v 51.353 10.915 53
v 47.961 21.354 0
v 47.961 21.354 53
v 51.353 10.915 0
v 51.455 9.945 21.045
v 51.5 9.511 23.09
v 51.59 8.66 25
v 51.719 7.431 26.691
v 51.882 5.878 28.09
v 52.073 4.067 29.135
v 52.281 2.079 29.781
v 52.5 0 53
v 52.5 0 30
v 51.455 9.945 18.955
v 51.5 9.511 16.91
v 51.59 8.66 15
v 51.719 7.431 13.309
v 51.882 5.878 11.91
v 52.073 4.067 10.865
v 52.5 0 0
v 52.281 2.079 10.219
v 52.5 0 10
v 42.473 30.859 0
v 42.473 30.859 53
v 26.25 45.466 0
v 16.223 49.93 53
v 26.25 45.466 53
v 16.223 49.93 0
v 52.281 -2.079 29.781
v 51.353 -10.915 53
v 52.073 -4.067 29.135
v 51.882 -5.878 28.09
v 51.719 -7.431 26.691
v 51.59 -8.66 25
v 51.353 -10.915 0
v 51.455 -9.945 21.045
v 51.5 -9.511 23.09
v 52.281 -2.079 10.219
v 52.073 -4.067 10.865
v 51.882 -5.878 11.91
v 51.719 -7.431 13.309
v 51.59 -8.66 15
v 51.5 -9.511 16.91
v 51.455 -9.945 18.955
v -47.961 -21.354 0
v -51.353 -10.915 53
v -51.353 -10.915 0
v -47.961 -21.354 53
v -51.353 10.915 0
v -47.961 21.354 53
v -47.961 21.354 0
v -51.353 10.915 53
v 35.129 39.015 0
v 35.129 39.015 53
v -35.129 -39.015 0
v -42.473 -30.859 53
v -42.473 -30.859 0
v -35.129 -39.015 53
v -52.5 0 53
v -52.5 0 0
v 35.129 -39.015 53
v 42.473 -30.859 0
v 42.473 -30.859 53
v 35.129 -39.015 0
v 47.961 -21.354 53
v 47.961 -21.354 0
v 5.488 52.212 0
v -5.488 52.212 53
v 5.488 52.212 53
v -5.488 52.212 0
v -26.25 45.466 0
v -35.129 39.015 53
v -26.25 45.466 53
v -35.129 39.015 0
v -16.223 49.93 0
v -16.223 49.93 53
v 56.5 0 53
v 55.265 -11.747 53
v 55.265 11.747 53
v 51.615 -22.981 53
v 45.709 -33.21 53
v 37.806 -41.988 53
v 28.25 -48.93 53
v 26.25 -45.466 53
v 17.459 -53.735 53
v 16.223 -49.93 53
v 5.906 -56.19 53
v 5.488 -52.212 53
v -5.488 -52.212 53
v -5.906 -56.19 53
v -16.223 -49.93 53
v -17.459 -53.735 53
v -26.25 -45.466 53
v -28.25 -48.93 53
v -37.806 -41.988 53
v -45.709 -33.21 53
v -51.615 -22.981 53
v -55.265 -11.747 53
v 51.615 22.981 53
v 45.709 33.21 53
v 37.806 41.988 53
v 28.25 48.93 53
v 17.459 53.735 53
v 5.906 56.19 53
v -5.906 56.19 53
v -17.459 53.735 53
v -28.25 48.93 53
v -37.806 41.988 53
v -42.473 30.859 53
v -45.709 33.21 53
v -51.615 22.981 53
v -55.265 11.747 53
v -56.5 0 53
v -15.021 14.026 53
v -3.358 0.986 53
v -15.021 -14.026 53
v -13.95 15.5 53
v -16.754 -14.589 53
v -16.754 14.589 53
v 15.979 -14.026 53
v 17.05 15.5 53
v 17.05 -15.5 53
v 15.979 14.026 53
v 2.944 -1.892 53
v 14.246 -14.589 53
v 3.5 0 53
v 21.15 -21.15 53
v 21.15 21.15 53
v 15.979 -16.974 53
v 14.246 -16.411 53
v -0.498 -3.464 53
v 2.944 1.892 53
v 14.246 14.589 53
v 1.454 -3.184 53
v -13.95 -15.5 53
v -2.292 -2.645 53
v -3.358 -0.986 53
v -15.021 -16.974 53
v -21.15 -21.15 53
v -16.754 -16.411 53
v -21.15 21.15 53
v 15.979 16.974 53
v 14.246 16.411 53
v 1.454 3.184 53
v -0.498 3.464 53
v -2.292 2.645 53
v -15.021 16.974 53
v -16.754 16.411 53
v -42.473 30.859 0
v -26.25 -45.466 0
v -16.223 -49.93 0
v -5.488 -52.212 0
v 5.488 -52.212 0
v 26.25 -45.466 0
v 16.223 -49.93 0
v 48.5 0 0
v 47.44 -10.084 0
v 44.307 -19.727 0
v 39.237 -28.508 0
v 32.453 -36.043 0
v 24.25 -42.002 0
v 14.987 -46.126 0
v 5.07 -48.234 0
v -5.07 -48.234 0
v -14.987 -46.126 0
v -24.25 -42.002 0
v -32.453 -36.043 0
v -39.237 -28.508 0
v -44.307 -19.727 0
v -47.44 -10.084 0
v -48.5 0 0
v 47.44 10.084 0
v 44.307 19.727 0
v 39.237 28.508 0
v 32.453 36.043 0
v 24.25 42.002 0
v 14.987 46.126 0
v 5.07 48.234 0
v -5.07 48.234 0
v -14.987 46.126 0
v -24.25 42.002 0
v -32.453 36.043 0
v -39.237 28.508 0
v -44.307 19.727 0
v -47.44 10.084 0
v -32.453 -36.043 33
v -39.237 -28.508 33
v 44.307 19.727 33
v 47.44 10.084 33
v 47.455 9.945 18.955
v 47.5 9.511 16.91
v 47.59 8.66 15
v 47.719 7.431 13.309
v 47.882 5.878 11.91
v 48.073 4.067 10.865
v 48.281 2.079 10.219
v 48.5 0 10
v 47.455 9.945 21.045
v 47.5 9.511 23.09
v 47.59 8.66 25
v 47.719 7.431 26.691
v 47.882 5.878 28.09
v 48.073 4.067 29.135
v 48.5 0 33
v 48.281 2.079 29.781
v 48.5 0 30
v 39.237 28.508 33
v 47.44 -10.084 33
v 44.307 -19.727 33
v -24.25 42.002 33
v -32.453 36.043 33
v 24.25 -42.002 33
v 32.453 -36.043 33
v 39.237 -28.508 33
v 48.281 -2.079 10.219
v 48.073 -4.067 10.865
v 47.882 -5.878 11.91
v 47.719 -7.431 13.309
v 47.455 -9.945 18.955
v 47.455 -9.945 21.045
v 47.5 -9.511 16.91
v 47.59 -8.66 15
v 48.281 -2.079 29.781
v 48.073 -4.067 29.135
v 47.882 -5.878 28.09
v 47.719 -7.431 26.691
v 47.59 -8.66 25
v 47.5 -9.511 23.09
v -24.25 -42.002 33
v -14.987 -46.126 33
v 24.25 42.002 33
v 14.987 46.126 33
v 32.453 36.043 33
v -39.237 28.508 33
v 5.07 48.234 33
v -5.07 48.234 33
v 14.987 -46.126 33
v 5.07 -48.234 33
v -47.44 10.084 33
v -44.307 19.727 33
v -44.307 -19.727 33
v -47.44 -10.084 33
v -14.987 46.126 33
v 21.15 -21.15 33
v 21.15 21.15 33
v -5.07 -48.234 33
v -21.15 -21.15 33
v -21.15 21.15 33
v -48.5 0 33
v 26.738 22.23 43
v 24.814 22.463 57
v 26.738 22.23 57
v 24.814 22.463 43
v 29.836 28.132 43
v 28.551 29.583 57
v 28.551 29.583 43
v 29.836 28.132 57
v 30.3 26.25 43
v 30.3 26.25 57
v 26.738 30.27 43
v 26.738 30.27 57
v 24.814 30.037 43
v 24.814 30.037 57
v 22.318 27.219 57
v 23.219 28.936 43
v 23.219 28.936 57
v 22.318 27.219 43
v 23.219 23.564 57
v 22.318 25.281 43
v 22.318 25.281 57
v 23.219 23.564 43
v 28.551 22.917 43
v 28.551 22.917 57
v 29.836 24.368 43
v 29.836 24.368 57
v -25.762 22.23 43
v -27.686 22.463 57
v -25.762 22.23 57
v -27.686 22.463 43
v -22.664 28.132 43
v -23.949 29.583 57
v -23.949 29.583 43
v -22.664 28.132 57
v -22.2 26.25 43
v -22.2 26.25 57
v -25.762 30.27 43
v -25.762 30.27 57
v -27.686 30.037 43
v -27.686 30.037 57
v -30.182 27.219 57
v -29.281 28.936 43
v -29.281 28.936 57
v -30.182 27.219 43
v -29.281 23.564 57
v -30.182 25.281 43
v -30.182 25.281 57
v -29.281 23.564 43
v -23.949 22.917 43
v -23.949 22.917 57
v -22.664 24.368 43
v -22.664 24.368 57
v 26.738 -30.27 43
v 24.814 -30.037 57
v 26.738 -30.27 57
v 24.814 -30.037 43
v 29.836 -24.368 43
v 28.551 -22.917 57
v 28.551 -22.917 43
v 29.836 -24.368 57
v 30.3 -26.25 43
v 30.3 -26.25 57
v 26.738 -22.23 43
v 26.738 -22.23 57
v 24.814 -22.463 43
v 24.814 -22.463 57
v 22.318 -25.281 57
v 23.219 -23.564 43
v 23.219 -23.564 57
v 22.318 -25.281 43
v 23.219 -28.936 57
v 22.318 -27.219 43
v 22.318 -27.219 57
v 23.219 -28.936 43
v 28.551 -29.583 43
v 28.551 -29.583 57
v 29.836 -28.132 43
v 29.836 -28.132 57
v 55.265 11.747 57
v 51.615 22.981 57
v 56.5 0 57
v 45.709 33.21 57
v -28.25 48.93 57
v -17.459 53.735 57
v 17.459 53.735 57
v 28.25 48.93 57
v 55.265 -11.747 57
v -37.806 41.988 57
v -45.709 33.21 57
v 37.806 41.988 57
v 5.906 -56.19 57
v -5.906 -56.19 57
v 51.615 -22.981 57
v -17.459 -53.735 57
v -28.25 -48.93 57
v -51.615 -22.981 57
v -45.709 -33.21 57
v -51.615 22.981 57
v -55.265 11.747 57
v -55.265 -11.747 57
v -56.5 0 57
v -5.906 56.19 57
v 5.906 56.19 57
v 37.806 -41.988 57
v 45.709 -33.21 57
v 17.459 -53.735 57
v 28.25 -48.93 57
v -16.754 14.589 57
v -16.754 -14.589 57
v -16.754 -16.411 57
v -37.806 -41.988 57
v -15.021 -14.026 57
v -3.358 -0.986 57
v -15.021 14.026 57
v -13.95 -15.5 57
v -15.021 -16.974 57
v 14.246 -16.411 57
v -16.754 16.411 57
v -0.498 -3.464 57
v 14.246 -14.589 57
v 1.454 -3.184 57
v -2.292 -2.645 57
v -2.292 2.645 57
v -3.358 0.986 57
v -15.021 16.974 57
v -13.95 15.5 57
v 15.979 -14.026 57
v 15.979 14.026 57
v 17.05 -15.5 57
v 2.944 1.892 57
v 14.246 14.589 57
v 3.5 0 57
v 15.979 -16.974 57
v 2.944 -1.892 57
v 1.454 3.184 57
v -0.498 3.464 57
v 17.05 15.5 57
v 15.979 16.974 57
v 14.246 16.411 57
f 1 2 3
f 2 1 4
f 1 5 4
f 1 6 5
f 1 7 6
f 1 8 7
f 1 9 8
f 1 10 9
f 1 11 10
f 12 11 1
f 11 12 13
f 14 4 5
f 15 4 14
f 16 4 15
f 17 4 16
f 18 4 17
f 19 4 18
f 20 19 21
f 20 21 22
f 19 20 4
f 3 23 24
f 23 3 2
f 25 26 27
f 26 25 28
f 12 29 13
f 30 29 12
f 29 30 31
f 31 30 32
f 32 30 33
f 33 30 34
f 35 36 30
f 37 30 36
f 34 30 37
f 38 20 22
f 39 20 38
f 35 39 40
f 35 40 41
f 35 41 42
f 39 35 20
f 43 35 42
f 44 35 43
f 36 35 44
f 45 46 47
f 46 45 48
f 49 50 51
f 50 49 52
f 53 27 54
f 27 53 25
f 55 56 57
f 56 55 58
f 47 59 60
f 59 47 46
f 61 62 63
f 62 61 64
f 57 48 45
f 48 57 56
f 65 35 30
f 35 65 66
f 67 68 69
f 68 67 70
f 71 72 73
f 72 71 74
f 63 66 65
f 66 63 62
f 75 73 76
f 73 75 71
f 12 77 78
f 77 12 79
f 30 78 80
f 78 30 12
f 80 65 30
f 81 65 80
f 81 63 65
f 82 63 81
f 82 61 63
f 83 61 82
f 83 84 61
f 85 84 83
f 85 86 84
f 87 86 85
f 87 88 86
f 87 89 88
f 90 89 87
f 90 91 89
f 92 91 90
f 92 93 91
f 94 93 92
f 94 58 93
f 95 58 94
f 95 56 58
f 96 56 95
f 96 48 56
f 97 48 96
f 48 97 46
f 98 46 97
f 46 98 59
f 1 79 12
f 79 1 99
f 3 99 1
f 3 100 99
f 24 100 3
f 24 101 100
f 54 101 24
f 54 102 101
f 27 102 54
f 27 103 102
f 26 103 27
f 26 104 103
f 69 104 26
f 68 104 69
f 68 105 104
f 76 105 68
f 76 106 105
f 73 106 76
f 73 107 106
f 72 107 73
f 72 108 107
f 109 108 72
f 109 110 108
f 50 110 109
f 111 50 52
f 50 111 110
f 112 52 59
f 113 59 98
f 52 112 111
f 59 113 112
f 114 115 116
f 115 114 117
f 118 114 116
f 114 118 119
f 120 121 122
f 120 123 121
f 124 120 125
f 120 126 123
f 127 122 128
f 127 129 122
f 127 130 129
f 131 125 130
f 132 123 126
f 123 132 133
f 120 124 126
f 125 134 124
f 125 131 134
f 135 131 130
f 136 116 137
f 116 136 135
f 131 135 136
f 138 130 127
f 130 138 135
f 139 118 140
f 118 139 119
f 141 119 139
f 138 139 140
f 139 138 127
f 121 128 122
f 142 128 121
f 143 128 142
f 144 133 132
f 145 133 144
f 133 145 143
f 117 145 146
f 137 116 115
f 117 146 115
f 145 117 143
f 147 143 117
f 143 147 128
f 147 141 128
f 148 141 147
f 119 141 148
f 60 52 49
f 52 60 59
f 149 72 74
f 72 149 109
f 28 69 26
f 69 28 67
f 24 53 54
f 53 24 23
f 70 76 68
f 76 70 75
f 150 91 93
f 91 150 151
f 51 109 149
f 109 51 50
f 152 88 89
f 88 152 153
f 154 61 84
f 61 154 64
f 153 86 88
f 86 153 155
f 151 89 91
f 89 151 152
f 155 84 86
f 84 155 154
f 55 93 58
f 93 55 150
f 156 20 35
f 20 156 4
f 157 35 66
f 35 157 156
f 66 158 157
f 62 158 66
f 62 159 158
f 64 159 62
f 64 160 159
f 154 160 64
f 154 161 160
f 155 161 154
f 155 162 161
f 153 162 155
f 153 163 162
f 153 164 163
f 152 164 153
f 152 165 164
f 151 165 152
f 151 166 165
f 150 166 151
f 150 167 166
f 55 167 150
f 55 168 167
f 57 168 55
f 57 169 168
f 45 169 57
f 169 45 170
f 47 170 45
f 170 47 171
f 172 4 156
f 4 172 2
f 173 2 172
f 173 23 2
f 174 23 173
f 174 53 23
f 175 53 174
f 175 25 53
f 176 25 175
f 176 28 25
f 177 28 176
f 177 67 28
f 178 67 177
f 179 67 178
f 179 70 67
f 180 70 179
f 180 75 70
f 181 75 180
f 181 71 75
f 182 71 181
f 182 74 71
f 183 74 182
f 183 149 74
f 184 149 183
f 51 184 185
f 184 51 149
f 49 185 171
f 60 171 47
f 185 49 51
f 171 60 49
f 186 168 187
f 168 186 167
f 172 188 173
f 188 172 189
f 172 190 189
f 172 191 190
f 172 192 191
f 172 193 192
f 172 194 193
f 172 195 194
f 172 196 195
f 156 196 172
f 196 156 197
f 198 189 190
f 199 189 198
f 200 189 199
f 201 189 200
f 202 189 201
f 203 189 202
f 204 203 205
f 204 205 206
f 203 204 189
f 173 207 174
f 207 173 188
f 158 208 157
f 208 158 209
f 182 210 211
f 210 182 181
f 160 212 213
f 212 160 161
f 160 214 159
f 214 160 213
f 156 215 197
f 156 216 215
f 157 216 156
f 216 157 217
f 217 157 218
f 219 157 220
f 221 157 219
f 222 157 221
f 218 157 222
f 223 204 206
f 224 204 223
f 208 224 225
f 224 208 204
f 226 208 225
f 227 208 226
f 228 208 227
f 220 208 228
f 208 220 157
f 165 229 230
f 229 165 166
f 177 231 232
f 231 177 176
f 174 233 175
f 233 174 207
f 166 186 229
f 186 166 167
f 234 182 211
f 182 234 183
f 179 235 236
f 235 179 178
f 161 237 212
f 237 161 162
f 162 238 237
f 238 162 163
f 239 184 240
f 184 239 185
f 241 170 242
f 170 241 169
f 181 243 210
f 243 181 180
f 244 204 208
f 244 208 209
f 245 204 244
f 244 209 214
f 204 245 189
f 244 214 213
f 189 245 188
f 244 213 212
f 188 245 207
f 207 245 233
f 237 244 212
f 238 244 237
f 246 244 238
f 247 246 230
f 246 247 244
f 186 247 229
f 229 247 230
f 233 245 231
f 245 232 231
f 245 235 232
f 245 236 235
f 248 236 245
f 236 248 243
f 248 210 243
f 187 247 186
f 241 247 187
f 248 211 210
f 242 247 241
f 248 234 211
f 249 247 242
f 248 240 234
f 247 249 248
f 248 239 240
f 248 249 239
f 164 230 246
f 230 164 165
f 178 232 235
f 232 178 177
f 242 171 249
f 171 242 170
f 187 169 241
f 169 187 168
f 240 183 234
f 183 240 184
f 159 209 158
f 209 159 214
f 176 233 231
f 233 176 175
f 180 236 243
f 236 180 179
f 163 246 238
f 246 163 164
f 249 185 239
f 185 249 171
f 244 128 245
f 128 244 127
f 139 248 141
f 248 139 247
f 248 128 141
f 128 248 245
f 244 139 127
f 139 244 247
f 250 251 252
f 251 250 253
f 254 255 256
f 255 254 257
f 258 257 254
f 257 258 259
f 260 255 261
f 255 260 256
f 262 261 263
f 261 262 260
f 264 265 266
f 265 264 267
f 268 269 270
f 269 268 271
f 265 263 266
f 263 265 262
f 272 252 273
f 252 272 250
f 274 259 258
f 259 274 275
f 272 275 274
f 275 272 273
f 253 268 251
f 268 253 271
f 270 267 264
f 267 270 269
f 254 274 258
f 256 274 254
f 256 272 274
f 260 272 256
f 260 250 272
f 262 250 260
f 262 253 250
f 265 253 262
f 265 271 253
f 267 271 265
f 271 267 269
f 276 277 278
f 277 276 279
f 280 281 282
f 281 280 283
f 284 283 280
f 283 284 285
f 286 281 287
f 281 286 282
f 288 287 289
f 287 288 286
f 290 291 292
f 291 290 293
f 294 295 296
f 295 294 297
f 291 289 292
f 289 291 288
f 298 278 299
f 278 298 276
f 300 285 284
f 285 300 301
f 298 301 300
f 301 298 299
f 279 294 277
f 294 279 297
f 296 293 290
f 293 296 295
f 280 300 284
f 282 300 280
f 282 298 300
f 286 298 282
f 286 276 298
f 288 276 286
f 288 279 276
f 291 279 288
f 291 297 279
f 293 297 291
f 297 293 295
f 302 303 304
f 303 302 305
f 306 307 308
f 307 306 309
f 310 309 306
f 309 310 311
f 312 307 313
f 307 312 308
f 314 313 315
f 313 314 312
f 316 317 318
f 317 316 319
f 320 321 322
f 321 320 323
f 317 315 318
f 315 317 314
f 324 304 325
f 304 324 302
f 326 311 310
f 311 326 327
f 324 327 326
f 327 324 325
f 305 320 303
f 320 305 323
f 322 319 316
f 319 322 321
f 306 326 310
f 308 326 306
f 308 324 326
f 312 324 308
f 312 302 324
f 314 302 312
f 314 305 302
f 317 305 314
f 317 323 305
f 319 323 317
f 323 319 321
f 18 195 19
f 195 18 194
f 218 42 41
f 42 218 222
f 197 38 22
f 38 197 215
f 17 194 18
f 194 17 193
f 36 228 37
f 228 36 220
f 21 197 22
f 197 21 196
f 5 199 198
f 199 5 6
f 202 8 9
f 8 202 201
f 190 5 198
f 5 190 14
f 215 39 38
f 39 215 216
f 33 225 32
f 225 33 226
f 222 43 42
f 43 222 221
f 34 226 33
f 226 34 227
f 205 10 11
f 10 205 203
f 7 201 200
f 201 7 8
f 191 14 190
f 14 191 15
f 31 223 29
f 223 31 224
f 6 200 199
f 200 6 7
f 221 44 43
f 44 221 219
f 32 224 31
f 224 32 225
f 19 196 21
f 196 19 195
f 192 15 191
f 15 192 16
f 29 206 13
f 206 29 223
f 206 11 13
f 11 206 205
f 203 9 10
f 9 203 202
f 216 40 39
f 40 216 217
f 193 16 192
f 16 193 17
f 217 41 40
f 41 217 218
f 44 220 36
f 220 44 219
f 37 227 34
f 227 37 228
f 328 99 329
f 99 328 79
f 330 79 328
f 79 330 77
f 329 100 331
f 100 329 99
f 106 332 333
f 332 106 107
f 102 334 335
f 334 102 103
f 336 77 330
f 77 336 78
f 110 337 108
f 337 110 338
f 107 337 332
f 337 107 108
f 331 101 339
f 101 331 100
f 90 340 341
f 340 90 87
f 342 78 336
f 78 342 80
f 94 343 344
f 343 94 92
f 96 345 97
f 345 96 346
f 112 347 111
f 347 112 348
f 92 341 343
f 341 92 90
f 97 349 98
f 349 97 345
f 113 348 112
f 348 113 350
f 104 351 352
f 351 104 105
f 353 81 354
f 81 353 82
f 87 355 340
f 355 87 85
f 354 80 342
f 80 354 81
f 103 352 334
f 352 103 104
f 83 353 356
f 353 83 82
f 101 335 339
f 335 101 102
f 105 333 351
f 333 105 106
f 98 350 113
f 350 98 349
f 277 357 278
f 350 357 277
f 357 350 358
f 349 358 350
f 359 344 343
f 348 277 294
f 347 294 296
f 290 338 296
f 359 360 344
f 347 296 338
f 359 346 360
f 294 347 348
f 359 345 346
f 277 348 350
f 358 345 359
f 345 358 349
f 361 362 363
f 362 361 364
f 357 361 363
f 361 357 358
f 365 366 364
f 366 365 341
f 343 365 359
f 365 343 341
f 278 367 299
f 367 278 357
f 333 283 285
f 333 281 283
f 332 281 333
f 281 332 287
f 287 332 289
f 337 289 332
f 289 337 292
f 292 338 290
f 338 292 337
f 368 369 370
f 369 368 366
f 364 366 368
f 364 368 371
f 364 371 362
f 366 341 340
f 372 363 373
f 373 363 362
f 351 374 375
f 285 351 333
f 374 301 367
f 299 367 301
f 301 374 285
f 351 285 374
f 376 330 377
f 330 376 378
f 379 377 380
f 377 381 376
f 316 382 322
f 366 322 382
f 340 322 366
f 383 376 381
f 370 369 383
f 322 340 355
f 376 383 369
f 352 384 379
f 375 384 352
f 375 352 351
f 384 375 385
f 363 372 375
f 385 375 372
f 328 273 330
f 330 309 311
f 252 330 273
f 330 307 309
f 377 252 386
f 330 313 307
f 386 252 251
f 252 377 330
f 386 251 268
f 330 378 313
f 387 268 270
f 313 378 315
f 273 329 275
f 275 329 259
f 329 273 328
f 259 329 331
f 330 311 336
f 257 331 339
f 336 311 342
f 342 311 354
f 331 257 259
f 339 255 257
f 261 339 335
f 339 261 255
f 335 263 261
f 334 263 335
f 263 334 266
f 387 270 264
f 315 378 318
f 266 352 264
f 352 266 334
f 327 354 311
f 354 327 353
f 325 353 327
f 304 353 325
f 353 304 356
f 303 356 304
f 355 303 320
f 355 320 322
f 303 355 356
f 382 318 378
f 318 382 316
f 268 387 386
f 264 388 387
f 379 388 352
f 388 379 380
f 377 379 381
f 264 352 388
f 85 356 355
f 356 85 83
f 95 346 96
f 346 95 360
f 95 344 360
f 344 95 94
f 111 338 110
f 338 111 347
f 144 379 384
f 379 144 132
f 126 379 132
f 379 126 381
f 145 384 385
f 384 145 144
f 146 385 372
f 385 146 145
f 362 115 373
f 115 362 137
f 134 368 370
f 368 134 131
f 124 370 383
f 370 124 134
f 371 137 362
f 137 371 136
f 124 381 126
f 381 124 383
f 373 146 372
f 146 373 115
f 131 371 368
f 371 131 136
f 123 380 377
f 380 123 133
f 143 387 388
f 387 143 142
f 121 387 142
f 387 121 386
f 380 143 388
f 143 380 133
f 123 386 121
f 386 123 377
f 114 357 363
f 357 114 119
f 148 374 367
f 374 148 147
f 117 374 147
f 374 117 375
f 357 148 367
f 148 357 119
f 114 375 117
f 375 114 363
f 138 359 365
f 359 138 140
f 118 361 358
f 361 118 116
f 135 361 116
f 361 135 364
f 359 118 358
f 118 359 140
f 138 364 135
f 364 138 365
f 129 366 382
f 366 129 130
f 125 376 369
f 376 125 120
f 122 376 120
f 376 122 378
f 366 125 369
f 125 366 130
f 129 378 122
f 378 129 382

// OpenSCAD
echo(version=version());

// units in mm
BASE_WIDTH = 113.0;
BASE_HEIGHT = 53.0;
BASE_WALL = 4.0;
INNER_RIDGE_HEIGHT = 6.0;
INNER_RIDGE_WIDTH = 2.0;

SUPPORT_WIDTH = BASE_WIDTH - INNER_RIDGE_WIDTH * 4;
SUPPORT_HEIGHT = 20.0;

RISER_HEIGHT = 4.0;

ROD_WIDTH = 8.1; // m8 
ROD_DEPTH = 10.0;

// stepper dims
STEPPER_WIDTH = 42.3;
STEPPER_HEIGHT = 33.0;
STEPPER_SCREW_SPACE = 31.0; 
STEPPER_HALF_SPACE = STEPPER_SCREW_SPACE / 2;
STEPPER_SCREW_SIZE = 3.1; // m3
STEPPER_SHAFT = 7.0;

ACCESS_HOLE_WIDTH = 20;
ACCESS_HOLE_Z_OFFSET = 20;

// support 
difference() {
    cylinder(h=BASE_HEIGHT, d=SUPPORT_WIDTH);
    cylinder(h=BASE_HEIGHT - SUPPORT_HEIGHT, d=(SUPPORT_WIDTH - 2 * BASE_WALL));
    translate([-1 * STEPPER_WIDTH / 2, -1 *STEPPER_WIDTH / 2, BASE_HEIGHT - STEPPER_HEIGHT])
        cube([STEPPER_WIDTH, STEPPER_WIDTH, STEPPER_HEIGHT]);
    
    // support rods
    translate([SUPPORT_WIDTH / 4, SUPPORT_WIDTH / 4, BASE_HEIGHT - ROD_DEPTH])
        cylinder(h=ROD_DEPTH, d=ROD_WIDTH);
    translate([-1 * SUPPORT_WIDTH / 4, SUPPORT_WIDTH / 4, BASE_HEIGHT - ROD_DEPTH])
        cylinder(h=ROD_DEPTH, d=ROD_WIDTH);
    translate([SUPPORT_WIDTH / 4, -1 * SUPPORT_WIDTH / 4, BASE_HEIGHT - ROD_DEPTH])
        cylinder(h=ROD_DEPTH, d=ROD_WIDTH);
    
    
    translate([SUPPORT_WIDTH / 2 - BASE_WALL * 2, 0, ACCESS_HOLE_Z_OFFSET])
    rotate ([0, 90, 0]) 
        cylinder(h=BASE_WALL * 4, d=ACCESS_HOLE_WIDTH);   
}

// top shelf
translate([0, 0, BASE_HEIGHT])
    difference() {
        cylinder(h=RISER_HEIGHT, d=BASE_WIDTH);
        
        // stepper shaft
        cylinder(h=RISER_HEIGHT, d=STEPPER_SHAFT);
        
        // stepper mounting screws
        translate([STEPPER_HALF_SPACE, STEPPER_HALF_SPACE, 0])
            cylinder(h=RISER_HEIGHT, d=STEPPER_SCREW_SIZE);
        translate([-1 * STEPPER_HALF_SPACE, STEPPER_HALF_SPACE, 0])
            cylinder(h=RISER_HEIGHT, d=STEPPER_SCREW_SIZE);
        translate([-1 * STEPPER_HALF_SPACE, -1 * STEPPER_HALF_SPACE, 0])
            cylinder(h=RISER_HEIGHT, d=STEPPER_SCREW_SIZE);
        translate([STEPPER_HALF_SPACE, -1 * STEPPER_HALF_SPACE, 0])
            cylinder(h=RISER_HEIGHT, d=STEPPER_SCREW_SIZE);
        
        // support rods
        translate([SUPPORT_WIDTH / 4, SUPPORT_WIDTH / 4, 0])
            cylinder(h=ROD_DEPTH, d=ROD_WIDTH);
        translate([-1 * SUPPORT_WIDTH / 4, SUPPORT_WIDTH / 4, 0])
            cylinder(h=ROD_DEPTH, d=ROD_WIDTH);
        translate([SUPPORT_WIDTH / 4, -1 * SUPPORT_WIDTH / 4, 0])
            cylinder(h=ROD_DEPTH, d=ROD_WIDTH);
    }
